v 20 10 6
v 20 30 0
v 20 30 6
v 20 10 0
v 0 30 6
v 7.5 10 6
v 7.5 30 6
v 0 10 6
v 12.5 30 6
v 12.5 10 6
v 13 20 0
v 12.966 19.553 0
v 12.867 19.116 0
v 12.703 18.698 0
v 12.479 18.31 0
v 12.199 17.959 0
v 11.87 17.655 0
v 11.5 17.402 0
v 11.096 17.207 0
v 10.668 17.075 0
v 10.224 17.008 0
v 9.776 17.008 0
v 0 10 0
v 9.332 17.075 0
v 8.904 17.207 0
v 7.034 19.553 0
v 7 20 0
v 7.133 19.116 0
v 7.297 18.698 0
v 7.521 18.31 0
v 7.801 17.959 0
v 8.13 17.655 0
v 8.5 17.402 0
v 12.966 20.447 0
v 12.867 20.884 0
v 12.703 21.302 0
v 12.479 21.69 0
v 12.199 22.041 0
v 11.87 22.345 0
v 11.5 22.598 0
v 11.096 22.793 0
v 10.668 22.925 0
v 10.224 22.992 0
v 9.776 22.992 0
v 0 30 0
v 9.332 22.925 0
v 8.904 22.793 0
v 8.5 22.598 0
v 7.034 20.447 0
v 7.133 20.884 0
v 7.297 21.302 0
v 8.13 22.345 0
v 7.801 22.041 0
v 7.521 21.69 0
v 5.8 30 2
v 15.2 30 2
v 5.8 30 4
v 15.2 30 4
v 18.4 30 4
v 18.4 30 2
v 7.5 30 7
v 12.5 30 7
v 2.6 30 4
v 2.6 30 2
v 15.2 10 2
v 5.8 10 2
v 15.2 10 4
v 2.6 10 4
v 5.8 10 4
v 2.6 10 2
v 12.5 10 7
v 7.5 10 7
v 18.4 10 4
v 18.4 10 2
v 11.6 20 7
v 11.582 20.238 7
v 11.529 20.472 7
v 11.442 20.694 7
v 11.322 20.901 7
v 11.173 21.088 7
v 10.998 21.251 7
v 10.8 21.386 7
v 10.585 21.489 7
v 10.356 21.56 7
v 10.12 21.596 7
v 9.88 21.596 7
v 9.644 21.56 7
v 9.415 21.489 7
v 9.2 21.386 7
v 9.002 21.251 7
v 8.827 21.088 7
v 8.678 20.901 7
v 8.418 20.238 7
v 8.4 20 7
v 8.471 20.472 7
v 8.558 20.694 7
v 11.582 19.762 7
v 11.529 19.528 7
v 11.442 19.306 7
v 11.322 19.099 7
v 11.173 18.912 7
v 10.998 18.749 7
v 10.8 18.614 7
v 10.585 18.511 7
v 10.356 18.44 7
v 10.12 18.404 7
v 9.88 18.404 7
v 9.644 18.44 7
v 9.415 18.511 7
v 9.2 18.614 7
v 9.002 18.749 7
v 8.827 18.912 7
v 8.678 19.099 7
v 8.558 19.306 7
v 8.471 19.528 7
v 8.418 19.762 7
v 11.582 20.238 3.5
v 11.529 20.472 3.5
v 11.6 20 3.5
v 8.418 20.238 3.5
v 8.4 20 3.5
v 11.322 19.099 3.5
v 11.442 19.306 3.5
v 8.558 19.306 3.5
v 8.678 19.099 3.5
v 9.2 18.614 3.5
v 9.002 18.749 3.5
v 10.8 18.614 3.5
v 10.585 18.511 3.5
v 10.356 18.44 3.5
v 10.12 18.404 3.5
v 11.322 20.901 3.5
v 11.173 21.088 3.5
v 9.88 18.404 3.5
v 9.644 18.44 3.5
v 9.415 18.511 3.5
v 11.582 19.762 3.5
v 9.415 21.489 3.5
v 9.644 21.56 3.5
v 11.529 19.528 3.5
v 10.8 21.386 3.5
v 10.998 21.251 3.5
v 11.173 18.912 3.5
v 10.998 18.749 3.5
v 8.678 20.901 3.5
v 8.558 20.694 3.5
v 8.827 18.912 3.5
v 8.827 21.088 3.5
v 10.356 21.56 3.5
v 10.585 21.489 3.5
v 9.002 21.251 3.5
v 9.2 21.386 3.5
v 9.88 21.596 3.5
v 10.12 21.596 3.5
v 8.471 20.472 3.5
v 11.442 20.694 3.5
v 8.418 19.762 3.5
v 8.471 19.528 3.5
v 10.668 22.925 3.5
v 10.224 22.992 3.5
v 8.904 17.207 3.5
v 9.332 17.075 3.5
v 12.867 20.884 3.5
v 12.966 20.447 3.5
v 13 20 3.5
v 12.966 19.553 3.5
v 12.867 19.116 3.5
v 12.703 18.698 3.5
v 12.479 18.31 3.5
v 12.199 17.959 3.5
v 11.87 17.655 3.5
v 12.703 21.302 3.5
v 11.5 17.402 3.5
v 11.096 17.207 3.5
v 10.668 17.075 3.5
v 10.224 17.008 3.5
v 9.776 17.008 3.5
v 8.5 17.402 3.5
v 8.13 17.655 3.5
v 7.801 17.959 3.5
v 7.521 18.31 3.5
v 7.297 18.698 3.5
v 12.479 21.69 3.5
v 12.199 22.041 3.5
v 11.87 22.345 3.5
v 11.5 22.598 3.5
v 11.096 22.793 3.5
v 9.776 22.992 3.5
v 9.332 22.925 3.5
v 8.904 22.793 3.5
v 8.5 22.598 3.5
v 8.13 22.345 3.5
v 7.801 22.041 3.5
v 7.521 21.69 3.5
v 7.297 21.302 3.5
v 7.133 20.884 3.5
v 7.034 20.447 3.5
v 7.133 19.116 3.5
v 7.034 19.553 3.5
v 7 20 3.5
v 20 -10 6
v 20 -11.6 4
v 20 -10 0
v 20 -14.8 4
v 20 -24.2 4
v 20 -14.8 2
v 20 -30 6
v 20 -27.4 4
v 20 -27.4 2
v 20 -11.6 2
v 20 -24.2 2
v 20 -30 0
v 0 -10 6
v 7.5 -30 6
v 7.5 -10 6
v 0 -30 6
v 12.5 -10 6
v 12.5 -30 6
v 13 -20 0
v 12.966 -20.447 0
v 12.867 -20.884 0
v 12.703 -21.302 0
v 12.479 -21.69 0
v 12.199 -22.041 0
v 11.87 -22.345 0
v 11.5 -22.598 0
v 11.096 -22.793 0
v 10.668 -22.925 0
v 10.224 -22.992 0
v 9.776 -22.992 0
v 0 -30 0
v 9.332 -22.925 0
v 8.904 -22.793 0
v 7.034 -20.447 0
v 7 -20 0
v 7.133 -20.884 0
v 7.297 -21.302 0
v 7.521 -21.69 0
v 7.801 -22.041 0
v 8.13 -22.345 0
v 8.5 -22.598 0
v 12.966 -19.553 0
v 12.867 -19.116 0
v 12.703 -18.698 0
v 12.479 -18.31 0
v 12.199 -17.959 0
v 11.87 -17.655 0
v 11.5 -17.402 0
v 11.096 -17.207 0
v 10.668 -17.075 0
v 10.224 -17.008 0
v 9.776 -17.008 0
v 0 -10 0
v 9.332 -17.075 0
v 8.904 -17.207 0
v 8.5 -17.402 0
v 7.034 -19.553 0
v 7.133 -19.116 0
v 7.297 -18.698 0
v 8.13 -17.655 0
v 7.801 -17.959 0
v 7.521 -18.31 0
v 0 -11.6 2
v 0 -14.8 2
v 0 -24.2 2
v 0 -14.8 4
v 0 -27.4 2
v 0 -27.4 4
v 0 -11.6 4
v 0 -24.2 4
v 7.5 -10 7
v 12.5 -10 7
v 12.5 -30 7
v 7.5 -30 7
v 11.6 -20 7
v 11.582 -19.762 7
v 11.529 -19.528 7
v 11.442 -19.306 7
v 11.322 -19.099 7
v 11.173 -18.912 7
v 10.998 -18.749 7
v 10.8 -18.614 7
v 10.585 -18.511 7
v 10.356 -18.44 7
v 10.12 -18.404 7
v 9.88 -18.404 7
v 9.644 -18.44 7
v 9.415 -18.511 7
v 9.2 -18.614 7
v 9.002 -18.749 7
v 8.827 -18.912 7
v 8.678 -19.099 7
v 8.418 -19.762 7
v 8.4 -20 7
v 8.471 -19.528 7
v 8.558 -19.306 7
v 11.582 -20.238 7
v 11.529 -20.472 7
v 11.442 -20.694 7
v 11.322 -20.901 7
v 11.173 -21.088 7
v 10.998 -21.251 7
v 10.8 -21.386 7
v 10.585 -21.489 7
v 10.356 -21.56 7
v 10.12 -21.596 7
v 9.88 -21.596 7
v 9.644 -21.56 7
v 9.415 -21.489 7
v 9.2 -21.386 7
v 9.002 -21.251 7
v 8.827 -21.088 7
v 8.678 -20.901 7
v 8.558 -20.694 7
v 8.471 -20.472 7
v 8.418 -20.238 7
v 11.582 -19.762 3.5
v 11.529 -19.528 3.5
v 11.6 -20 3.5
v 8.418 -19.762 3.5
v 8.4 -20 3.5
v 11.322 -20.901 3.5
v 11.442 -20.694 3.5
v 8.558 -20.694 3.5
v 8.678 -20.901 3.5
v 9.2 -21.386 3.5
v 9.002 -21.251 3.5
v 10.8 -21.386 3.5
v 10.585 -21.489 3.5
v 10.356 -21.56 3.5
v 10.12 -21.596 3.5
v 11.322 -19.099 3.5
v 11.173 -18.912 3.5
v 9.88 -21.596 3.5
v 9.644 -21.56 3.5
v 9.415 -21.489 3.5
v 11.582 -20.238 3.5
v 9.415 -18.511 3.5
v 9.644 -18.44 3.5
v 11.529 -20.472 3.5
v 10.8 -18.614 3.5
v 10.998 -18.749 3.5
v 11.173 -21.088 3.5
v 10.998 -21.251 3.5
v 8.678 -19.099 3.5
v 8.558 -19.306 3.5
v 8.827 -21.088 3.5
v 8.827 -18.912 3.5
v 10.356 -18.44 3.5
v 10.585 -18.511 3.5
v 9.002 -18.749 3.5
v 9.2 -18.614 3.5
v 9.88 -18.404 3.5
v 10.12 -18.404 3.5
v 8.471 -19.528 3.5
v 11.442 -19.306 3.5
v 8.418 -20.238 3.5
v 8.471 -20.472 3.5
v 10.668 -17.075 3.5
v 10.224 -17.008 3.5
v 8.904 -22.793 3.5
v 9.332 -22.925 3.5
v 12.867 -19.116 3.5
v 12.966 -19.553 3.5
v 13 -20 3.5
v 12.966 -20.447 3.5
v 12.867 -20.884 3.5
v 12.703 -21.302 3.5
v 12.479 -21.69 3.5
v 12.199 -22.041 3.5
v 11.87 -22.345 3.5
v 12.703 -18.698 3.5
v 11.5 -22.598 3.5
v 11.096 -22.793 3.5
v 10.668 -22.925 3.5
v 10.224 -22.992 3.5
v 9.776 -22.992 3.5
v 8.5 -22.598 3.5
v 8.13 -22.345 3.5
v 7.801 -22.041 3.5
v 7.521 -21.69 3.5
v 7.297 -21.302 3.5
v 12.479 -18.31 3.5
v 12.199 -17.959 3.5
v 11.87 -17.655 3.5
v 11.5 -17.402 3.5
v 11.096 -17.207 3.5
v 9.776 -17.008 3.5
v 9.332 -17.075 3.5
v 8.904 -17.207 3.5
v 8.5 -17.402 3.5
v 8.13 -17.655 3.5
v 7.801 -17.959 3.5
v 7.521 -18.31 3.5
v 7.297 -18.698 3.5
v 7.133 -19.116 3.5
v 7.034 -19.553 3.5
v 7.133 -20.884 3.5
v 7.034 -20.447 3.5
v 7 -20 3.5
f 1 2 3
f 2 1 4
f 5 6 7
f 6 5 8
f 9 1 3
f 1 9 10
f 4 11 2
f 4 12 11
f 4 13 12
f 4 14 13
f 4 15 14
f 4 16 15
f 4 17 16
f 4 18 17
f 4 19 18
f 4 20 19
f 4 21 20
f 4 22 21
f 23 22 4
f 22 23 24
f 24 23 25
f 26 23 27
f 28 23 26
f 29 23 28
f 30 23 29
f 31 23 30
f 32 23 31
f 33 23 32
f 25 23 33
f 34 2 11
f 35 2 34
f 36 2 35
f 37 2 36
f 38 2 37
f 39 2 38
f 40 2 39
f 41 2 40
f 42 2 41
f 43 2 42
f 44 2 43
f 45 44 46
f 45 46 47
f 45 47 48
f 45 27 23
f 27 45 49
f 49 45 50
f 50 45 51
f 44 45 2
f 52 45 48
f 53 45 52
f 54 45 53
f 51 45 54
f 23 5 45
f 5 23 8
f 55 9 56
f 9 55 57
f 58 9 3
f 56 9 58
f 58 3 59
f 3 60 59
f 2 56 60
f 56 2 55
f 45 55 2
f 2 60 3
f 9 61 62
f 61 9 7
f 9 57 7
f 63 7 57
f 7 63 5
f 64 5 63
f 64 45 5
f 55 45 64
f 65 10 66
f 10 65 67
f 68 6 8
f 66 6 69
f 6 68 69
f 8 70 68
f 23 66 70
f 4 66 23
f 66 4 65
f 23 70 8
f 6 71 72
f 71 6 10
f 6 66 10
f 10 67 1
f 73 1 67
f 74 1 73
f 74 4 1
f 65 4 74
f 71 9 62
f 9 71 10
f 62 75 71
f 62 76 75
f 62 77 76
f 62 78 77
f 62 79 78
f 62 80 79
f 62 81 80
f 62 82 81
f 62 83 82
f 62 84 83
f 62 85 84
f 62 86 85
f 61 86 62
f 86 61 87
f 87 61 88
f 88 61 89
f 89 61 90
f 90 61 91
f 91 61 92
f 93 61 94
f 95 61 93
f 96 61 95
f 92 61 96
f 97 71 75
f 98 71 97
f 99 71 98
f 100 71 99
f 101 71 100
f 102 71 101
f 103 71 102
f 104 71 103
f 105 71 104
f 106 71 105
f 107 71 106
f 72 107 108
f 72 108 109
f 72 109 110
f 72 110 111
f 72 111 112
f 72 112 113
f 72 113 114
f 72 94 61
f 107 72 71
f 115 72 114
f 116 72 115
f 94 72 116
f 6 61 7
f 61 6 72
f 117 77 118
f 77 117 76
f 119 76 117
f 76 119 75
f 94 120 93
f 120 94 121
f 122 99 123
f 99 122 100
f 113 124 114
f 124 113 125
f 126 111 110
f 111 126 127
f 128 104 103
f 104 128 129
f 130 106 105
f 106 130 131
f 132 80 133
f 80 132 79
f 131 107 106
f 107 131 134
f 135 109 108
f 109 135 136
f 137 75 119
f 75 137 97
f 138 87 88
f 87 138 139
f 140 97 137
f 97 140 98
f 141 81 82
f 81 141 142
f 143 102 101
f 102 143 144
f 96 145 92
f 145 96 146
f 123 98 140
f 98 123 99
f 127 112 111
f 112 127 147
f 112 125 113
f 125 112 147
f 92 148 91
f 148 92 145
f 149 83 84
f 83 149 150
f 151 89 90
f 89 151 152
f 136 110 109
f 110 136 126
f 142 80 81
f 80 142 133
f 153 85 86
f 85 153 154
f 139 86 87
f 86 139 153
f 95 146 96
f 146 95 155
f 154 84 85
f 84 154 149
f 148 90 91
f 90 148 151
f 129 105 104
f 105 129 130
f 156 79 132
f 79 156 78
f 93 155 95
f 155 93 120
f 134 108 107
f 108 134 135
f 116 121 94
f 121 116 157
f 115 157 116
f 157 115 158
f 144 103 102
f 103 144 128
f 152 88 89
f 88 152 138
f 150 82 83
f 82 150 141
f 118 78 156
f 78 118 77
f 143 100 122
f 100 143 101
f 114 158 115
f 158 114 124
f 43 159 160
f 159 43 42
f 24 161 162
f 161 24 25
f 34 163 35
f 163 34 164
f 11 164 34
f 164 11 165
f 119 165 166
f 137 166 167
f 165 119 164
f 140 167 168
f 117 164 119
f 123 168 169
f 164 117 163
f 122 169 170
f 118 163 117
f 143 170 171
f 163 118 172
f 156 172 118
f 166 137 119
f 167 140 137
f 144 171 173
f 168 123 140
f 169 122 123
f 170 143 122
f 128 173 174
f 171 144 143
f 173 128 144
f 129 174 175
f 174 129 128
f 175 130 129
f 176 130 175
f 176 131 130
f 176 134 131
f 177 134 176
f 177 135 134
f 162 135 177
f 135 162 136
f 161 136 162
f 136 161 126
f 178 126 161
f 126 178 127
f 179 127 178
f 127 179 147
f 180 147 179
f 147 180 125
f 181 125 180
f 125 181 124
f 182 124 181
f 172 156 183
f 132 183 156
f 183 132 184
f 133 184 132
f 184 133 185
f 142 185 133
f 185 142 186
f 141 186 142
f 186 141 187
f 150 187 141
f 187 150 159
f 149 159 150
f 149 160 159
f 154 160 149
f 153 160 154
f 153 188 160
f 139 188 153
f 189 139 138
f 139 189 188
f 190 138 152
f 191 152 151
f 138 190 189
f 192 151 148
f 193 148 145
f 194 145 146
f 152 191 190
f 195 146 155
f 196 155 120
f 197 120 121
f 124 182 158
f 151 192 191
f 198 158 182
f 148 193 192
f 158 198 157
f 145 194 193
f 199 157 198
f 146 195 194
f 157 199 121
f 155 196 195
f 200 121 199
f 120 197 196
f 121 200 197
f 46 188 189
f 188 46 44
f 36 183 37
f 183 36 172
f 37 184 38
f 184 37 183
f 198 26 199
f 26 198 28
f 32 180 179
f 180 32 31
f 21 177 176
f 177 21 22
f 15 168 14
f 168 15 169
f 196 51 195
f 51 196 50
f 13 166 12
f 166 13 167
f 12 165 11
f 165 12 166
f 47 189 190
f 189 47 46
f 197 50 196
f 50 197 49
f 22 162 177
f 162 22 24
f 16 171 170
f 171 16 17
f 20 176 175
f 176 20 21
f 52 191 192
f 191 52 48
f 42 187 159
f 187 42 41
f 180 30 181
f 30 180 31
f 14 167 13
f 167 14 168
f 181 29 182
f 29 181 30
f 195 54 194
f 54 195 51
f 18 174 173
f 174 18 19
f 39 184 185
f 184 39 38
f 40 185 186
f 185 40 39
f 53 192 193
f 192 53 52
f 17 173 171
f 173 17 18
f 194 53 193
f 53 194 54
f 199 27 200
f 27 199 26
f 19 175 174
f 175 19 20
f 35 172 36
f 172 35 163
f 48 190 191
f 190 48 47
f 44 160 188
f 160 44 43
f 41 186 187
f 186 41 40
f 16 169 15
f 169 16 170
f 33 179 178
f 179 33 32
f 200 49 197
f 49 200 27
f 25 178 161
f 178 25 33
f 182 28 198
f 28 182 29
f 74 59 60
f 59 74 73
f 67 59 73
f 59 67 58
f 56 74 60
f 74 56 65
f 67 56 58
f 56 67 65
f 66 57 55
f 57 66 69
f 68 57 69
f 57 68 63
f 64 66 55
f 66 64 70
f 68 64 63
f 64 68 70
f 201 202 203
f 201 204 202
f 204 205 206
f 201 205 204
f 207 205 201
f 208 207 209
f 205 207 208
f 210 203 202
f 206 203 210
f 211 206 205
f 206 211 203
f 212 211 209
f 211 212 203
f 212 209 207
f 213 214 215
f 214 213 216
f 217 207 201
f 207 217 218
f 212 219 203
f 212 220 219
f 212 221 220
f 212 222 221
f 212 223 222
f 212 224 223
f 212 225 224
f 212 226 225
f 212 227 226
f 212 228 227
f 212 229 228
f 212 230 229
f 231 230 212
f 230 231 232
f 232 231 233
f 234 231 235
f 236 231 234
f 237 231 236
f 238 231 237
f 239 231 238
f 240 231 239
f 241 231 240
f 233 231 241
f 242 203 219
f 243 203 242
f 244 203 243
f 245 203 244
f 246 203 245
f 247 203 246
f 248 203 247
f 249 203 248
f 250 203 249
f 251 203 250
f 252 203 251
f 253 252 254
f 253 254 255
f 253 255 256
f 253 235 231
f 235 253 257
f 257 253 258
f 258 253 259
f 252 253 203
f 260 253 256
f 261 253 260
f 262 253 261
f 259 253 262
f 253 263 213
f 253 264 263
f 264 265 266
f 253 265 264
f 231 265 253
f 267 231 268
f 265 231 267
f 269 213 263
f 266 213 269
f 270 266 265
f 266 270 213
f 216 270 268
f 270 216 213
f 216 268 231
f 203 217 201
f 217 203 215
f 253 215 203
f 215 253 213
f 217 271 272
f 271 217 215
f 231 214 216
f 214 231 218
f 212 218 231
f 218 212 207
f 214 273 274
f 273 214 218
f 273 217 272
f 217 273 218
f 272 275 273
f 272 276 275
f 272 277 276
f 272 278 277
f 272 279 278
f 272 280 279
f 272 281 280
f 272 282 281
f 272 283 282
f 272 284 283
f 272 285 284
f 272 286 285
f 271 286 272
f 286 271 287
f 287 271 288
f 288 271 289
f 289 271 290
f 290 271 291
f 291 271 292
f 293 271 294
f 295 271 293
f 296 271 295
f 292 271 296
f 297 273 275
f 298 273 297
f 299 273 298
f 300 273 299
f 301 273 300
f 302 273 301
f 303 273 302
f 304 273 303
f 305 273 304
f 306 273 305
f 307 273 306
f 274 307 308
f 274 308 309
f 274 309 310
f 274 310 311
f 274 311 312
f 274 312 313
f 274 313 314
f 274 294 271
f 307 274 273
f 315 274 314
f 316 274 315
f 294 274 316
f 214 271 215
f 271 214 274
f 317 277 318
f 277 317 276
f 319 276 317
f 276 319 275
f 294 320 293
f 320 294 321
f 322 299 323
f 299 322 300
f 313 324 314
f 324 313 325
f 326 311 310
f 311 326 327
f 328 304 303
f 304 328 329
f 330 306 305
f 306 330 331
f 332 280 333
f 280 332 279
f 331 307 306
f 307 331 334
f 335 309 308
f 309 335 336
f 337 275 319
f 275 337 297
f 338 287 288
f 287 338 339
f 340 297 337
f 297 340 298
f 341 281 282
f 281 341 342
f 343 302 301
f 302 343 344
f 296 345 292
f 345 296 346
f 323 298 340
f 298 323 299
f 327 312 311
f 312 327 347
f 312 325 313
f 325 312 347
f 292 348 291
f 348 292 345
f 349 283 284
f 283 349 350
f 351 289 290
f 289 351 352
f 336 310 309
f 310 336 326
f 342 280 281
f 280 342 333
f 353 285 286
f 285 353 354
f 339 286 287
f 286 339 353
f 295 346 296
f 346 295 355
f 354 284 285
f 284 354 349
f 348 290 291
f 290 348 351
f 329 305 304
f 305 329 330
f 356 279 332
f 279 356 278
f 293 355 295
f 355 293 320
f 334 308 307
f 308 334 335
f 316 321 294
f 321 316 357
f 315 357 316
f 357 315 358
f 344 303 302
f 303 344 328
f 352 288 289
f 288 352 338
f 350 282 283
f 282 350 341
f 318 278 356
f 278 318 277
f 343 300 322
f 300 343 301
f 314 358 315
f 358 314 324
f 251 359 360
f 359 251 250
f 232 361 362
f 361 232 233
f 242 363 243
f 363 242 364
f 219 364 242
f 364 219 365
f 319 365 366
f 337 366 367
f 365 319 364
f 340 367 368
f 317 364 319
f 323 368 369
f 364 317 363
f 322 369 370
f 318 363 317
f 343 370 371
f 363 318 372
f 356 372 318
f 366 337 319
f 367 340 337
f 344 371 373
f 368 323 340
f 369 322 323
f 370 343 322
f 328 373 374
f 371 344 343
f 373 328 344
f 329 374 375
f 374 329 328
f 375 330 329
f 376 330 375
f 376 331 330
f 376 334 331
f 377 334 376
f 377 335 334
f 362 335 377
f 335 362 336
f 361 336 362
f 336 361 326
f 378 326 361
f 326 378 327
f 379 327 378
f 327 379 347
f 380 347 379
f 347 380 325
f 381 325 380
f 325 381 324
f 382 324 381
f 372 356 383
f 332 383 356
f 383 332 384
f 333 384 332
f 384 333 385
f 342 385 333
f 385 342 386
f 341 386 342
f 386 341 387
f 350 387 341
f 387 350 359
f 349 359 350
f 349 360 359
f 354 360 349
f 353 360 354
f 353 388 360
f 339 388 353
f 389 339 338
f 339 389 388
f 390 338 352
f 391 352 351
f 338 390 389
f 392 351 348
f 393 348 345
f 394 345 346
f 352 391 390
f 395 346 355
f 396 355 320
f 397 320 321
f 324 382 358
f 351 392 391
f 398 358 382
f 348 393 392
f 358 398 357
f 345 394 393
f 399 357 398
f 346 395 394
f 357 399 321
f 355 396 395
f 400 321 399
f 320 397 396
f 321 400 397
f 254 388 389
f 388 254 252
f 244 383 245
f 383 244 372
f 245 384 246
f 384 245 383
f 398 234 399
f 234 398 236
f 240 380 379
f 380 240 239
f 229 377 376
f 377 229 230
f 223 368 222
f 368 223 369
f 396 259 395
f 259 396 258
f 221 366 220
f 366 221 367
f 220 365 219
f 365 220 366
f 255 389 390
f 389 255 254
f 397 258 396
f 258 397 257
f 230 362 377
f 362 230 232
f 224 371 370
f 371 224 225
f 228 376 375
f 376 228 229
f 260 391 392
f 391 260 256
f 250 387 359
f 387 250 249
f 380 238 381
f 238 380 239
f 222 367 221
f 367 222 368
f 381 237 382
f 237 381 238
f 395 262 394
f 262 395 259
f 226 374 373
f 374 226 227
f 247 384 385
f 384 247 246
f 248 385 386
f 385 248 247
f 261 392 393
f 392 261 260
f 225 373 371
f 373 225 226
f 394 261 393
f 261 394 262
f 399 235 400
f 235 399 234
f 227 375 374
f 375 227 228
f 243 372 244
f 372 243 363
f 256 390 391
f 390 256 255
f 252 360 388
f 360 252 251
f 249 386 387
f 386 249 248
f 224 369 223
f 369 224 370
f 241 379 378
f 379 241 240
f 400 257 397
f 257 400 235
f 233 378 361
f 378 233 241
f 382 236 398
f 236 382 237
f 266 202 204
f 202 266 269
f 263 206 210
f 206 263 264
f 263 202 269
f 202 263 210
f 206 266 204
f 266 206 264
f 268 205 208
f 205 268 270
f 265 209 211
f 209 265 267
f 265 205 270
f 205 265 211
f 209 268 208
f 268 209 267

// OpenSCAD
wall = 4.0;
screw_dia = 5.2;
screw_head = 10.0;
screw_bottom = 2.0;
width = 40.0;
height = 25.0;
screw_off_x = 10.0;
screw_off_y = 10.0;
screw_dist = 24.15 - 9.35;

tie_off_z = 2.0;
cabletie_width = 3.2;
cabletie_height = 2.0;
tie_wall_side = 1.0;
tie_wall_top = 1.0;
tie_wall = 5.0;
tie_width = cabletie_width + 2 * tie_wall_side;
tie_height = cabletie_height + 2 * tie_wall_top;
tie_add_bottom = 2.0;

$fn = 42;

module cable() {
    translate([-(tie_width + tie_add_bottom) / 2, -(tie_wall + tie_add_bottom) / 2, 0])
    translate([tie_add_bottom / 2, tie_add_bottom / 2, 0])
    difference() {
        hull() {
            cube([tie_width, tie_wall, tie_height + tie_off_z]);
            
            translate([-tie_add_bottom / 2, -tie_add_bottom / 2, 0])
            cube([tie_width + tie_add_bottom, tie_wall + tie_add_bottom, 0.1]);
        }
        
        translate([(tie_width - cabletie_width) / 2, -1, (tie_height - cabletie_height) / 2 + tie_off_z])
        cube([cabletie_width, tie_wall + 2, cabletie_height]);
    }
}

module x_tie() {
    difference() {
        union() {
            cube([width, height, wall]);
            
            translate([5 + 1, 20 - 1, wall])
            rotate([0, 0, -45])
            cable();
        }
        
        for (i = [0, screw_dist])
        translate([width - screw_off_x - i, screw_off_y, 0]) {
            translate([0, 0, -1])
            cylinder(d = screw_dia, h = wall + 2);
            
            translate([0, 0, screw_bottom])
            cylinder(d = screw_head, h = wall + 2);
        }
    }
}

rail = 20;
rail_wall = 2.0;
rail_h = cabletie_height + 2 * rail_wall;
rail_screw = 3.2;
rail_screw_head = 6.0;
rail_screw_len = 3.5;

module rail_tie(rot) {
    difference() {
        union() {
            cube([rail, rail, rail_h]);
            
            translate([(rail - (rail / 4)) / 2, 0, rail_h])
            cube([rail / 4, rail, 1]);
        }
        
        translate([rail / 2, rail / 2, -1]) {
            cylinder(d = rail_screw, h = rail_h + 3);
            cylinder(d = rail_screw_head, h = rail_screw_len + 1);
        }
        
        for (x = [1, 4])
        if (rot) {
            translate([-1, (rail - rail_screw) / x - cabletie_width / 2, rail_wall])
            cube([rail + 2, cabletie_width, cabletie_height]);
        } else {
            translate([(rail - rail_screw) / x - cabletie_width / 2, -1, rail_wall])
            cube([cabletie_width, rail + 2, cabletie_height]);
        }
    }
}

module rail_assembly() {
    %translate([0, -50, rail_h])
    cube([20, 100, 20]);
    
    translate([0, 10, 0])
    rail_tie(0);
    
    translate([0, -10 - rail, 0])
    rail_tie(1);
}

rail_assembly();

//x_tie();
//rail_tie(0);
//rail_tie(1);
